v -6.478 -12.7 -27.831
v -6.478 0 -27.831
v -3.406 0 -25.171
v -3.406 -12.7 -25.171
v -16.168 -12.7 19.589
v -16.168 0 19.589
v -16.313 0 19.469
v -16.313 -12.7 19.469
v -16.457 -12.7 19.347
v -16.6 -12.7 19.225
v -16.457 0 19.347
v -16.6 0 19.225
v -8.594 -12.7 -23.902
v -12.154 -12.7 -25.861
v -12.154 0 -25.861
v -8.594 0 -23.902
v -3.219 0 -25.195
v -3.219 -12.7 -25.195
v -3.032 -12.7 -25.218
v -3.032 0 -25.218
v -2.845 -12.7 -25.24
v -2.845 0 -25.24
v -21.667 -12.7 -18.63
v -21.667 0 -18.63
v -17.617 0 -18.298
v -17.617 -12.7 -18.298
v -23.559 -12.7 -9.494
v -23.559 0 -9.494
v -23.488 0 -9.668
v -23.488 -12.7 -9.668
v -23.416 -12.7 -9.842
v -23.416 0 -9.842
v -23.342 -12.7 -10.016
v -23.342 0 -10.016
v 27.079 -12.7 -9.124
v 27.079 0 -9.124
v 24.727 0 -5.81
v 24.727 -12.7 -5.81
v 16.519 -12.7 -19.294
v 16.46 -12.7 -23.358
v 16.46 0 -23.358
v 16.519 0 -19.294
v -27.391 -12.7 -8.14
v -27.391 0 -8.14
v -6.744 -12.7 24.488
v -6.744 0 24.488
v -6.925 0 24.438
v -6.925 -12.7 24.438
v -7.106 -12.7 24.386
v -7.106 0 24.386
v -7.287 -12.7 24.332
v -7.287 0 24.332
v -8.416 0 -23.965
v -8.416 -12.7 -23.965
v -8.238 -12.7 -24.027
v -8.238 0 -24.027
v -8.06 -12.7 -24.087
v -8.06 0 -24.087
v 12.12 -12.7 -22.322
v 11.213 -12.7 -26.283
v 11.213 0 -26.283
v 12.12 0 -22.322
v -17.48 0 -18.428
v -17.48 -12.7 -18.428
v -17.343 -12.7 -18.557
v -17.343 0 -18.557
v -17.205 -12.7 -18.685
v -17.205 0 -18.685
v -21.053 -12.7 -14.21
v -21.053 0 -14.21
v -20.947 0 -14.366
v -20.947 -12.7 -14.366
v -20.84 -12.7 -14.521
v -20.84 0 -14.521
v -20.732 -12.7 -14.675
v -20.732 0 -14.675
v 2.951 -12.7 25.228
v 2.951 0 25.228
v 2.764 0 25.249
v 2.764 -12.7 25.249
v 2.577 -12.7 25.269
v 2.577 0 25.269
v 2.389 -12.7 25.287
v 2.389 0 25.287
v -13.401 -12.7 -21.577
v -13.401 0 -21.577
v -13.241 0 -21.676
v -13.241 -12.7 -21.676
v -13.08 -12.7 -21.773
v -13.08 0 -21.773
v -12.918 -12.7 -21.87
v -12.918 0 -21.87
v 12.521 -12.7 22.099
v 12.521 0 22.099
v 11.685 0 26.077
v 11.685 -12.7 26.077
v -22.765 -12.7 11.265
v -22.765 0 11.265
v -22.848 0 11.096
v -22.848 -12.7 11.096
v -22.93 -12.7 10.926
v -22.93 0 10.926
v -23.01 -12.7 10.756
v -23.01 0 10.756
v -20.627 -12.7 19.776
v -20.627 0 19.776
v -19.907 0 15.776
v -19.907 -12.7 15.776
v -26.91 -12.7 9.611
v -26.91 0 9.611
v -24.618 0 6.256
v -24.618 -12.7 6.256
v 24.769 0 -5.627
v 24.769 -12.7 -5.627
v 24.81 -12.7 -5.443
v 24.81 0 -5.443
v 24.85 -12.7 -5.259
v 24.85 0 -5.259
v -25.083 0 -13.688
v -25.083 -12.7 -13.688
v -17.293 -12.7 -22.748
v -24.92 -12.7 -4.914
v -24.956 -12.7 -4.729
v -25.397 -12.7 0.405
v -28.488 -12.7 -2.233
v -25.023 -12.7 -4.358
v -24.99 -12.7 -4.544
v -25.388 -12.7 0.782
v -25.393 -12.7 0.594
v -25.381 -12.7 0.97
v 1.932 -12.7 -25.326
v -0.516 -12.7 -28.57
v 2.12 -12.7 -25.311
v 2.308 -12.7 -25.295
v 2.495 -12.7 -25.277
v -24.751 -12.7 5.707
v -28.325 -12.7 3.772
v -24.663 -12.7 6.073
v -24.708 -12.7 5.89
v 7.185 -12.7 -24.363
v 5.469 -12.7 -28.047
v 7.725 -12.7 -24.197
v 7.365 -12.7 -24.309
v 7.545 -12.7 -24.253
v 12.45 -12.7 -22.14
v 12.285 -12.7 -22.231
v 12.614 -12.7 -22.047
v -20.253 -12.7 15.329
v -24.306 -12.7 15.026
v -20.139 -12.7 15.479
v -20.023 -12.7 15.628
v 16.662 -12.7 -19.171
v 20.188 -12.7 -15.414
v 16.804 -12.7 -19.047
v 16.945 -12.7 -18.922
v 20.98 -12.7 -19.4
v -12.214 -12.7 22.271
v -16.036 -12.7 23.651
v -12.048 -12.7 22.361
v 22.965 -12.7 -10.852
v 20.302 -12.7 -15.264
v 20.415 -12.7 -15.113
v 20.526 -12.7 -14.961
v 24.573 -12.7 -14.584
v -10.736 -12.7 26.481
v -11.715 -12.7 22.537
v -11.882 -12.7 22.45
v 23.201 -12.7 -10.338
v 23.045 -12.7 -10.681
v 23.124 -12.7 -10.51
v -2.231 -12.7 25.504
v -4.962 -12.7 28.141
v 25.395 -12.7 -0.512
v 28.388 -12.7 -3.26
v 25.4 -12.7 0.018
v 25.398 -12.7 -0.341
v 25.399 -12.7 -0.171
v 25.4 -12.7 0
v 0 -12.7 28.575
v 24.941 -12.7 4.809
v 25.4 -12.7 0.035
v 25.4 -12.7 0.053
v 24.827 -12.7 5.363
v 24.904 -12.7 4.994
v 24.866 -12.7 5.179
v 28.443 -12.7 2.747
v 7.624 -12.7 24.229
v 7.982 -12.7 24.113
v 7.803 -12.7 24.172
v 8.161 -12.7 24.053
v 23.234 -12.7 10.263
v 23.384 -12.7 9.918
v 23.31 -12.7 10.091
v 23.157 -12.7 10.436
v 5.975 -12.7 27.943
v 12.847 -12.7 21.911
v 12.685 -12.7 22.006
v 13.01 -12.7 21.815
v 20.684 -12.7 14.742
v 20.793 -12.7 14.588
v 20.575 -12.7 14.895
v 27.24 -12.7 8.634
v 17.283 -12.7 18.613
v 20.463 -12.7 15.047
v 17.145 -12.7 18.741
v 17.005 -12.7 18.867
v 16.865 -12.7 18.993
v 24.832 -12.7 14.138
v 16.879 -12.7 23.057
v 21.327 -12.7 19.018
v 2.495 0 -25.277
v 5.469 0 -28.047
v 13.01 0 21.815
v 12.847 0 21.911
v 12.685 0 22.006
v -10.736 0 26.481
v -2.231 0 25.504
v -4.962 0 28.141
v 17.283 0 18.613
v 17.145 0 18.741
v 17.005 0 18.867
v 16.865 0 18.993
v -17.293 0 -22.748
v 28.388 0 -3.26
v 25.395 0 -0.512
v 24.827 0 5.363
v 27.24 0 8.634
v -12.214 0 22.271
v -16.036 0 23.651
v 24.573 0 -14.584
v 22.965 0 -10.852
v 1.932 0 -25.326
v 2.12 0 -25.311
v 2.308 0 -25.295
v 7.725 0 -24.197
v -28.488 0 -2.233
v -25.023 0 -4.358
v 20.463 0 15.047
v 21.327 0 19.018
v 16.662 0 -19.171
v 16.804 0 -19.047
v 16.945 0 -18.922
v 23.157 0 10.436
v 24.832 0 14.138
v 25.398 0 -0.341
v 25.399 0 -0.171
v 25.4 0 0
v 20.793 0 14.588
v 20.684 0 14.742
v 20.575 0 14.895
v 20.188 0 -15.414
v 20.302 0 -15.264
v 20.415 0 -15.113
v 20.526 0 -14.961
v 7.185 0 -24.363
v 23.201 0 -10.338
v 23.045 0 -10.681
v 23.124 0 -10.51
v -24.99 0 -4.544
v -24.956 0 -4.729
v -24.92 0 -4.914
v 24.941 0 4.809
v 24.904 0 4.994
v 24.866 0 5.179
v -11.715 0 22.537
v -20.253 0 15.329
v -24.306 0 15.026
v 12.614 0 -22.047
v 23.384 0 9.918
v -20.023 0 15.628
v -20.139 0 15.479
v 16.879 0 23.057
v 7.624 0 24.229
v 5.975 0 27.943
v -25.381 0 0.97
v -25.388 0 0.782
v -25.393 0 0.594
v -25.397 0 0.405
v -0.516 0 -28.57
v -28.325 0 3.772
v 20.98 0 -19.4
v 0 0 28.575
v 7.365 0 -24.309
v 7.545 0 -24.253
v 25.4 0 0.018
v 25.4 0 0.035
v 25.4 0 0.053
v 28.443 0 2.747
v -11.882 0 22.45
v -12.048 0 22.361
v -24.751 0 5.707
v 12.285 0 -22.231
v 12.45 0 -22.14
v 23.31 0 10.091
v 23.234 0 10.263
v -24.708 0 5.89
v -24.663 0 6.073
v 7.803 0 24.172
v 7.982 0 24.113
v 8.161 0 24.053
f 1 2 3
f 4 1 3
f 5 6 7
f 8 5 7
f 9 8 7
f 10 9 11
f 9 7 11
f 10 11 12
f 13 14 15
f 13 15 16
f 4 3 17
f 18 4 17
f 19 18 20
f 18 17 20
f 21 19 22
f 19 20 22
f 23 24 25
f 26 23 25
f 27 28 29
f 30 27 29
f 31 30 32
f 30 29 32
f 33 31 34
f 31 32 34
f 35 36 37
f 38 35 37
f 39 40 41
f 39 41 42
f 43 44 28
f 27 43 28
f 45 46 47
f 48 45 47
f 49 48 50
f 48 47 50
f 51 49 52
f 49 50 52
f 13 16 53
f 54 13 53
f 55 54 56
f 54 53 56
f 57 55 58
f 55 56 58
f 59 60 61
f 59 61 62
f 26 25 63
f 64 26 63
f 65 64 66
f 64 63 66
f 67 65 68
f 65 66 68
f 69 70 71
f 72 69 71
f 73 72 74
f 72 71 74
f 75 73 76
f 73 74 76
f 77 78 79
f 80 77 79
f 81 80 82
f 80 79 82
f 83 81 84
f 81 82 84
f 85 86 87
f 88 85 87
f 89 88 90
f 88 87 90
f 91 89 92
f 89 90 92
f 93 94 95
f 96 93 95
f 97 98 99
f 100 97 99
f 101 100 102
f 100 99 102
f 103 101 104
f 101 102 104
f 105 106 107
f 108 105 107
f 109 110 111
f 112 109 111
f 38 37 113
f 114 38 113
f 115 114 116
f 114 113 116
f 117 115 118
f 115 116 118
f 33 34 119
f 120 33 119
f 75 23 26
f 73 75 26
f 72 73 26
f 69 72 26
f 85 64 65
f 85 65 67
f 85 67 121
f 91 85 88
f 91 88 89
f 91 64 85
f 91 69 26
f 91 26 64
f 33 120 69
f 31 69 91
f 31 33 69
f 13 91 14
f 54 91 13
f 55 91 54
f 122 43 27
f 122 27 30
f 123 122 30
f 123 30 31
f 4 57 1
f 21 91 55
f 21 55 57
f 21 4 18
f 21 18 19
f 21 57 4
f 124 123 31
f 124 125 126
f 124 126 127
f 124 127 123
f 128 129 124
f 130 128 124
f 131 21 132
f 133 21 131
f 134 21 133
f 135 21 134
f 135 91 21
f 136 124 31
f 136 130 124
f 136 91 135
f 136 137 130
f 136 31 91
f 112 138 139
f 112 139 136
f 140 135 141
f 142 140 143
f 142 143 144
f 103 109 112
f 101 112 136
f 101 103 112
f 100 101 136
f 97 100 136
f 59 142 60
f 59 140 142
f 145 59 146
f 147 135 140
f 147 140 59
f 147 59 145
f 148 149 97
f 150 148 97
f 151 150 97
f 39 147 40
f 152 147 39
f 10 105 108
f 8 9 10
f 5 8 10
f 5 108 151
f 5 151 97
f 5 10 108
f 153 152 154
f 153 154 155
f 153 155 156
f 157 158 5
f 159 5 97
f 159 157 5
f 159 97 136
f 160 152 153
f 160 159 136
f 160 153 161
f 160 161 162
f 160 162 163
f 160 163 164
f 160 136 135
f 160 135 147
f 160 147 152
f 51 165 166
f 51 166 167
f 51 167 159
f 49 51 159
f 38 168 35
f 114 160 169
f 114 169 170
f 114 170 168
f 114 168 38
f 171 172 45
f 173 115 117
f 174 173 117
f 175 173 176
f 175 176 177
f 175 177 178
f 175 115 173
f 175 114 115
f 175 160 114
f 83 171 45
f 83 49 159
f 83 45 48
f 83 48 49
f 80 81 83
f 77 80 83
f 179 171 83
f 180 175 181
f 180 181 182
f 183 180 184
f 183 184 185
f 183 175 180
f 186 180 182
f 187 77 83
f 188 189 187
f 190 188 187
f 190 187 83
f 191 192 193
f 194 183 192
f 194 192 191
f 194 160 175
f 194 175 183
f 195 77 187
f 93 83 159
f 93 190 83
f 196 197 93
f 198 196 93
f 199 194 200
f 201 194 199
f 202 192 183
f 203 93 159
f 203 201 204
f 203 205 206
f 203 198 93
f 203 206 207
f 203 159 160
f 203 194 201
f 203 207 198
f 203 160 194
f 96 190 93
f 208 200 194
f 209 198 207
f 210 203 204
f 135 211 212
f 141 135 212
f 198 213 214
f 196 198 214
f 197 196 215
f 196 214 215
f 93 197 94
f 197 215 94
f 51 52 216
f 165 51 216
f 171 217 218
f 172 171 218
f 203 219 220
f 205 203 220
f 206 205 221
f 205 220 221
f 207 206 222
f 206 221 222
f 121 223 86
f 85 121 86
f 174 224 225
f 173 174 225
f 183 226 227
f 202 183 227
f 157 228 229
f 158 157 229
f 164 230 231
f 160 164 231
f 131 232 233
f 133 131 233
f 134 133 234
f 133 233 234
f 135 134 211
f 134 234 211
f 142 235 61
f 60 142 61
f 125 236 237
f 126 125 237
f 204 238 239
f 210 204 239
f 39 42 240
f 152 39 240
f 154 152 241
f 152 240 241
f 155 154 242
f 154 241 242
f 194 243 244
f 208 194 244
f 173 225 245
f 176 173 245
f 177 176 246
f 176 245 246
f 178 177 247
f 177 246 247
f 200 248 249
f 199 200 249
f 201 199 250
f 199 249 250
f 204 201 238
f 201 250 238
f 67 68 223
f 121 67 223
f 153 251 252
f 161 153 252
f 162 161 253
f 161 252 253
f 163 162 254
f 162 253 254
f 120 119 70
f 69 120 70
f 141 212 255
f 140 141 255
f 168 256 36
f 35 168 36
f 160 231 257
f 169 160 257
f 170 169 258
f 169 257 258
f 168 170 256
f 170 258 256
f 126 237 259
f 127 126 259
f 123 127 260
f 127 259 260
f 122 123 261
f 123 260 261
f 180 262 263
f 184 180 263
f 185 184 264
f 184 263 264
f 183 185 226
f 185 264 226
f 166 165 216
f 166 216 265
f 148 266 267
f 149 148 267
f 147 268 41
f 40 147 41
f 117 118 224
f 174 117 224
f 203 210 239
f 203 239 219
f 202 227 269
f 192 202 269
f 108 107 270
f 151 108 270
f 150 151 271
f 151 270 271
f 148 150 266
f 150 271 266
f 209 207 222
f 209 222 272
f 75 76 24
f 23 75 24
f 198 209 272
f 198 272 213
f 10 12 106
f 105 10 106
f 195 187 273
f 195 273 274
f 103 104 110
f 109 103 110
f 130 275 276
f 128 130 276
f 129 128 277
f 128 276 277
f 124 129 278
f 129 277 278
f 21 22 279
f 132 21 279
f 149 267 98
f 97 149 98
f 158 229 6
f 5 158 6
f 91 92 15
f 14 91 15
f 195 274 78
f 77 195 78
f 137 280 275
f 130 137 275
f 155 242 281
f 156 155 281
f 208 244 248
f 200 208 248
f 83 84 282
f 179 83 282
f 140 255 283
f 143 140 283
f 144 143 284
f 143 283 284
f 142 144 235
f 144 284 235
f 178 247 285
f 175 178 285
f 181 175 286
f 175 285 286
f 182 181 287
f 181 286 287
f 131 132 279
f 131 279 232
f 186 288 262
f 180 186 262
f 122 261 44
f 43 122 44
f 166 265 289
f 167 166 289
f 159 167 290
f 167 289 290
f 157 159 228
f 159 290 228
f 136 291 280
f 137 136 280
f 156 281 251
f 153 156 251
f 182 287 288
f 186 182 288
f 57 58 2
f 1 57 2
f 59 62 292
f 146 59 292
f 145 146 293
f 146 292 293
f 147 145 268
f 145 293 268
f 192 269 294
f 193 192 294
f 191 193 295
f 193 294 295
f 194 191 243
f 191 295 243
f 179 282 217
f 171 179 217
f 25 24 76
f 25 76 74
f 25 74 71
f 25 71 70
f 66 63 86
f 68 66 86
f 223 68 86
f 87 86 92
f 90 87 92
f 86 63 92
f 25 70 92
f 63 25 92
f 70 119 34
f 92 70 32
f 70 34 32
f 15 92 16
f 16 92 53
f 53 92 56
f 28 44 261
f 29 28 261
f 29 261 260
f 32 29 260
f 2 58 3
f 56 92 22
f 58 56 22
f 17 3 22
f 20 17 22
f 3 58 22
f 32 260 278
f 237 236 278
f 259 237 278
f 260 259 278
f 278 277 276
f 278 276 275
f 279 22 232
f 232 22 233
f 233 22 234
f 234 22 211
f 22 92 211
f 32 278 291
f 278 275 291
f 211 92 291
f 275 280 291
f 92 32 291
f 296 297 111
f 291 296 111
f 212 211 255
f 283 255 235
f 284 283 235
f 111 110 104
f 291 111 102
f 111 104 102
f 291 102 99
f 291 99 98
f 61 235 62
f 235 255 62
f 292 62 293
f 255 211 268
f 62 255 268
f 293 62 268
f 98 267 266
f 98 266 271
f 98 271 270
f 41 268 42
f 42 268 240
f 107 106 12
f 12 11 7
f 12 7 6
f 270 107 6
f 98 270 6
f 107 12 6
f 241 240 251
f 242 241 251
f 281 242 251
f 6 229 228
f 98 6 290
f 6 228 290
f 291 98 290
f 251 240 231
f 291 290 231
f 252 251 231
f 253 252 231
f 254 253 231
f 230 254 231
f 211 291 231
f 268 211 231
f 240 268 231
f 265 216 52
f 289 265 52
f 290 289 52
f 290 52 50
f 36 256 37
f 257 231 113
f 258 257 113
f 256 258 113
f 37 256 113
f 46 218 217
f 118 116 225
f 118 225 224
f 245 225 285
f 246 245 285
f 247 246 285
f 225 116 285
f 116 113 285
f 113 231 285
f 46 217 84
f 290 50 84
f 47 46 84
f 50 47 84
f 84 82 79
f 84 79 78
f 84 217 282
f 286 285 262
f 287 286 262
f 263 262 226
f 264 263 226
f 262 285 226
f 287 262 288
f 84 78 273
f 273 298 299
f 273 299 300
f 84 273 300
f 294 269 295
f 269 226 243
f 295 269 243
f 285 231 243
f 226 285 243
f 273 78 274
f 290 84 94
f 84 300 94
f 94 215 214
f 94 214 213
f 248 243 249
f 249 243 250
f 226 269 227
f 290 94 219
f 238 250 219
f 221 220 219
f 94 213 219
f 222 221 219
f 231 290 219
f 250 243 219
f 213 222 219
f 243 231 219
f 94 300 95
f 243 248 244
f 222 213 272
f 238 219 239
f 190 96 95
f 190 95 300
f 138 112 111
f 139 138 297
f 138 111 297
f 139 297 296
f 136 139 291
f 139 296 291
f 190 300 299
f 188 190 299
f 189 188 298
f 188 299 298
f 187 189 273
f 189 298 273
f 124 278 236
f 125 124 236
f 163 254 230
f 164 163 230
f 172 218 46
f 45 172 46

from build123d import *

# Parameters (mm, degrees)
F1_DEPTH = 12.7


with BuildPart() as f1:
    # F0 (on Front) → F1 (new body)
    with BuildSketch(Plane.XZ):
        with BuildLine():
            ThreePointArc((25.3948429948, -0.5118097985), (25.398710716, -0.2559178894), (25.4, 0))
            ThreePointArc((25.4, 0), (25.3999860485, 0.0266220613), (25.3999441942, 0.0532440933))
            ThreePointArc((25.3999441942, 0.0532440933), (25.2823297123, 2.4420901537), (24.9405452403, 4.8092830148))
            ThreePointArc((24.9405452403, 4.8092830148), (24.8855058459, 5.0864131562), (24.8273871825, 5.3629139178))
            ThreePointArc((24.8273871825, 5.3629139178), (24.2128911527, 7.6743665555), (23.383707488, 9.917773143))
            ThreePointArc((23.383707488, 9.917773143), (23.2719398097, 10.1772696484), (23.1572925209, 10.4355068444))
            ThreePointArc((23.1572925209, 10.4355068444), (22.0730798045, 12.5673842921), (20.7931524471, 14.5878309324))
            ThreePointArc((20.7931524471, 14.5878309324), (20.6295973686, 14.8182223093), (20.4634896365, 15.0467801172))
            ThreePointArc((20.4634896365, 15.0467801172), (18.9574897343, 16.9048390402), (17.2834000897, 18.6130083903))
            ThreePointArc((17.2834000897, 18.6130083903), (17.0752878467, 18.8041097889), (16.8650627512, 18.9928844149))
            ThreePointArc((16.8650627512, 18.9928844149), (15.0038509972, 20.4949861004), (13.0096050977, 21.8153655757))
            ThreePointArc((13.0096050977, 21.8153655757), (12.7661356522, 21.9587290277), (12.5210865577, 22.0993753625))
            ThreePointArc((12.5210865577, 22.0993753625), (10.386941041, 23.1791168039), (8.1606979804, 24.053336743))
            ThreePointArc((8.1606979804, 24.053336743), (7.892634321, 24.1426246186), (7.6235940472, 24.2289251475))
            ThreePointArc((7.6235940472, 24.2289251475), (5.3108583666, 24.8385745044), (2.9510330751, 25.2279885007))
            ThreePointArc((2.9510330751, 25.2279885007), (2.6702254201, 25.2592536748), (2.3890873582, 25.2873933333))
            ThreePointArc((2.3890873582, 25.2873933333), (0.1760546114, 25.3993898504), (-2.0383180173, 25.3180816742))
            ThreePointArc((-2.0383180173, 25.3180816742), (-2.2137558658, 25.3033453315), (-2.3890873582, 25.2873933333))
            ThreePointArc((-2.3890873582, 25.2873933333), (-4.5839377077, 24.982944484), (-6.7439015233, 24.4883603421))
            ThreePointArc((-6.7439015233, 24.4883603421), (-7.0158820659, 24.411829076), (-7.2869944811, 24.3322771526))
            ThreePointArc((-7.2869944811, 24.3322771526), (-9.5433476931, 23.5389998685), (-11.7150832222, 22.5370101189))
            ThreePointArc((-11.7150832222, 22.5370101189), (-11.9650502401, 22.4053023356), (-12.2135367333, 22.2708221775))
            ThreePointArc((-12.2135367333, 22.2708221775), (-14.2541514602, 21.0233005532), (-16.1683793774, 19.5893723306))
            ThreePointArc((-16.1683793774, 19.5893723306), (-16.3852826458, 19.4083104009), (-16.6001584412, 19.2248469364))
            ThreePointArc((-16.6001584412, 19.2248469364), (-18.3348257747, 17.5782298259), (-19.9069243197, 15.7757524109))
            ThreePointArc((-19.9069243197, 15.7757524109), (-20.0811752538, 15.5533404909), (-20.2529413947, 15.3290040402))
            ThreePointArc((-20.2529413947, 15.3290040402), (-21.604977361, 13.3560830047), (-22.7654491948, 11.2647380332))
            ThreePointArc((-22.7654491948, 11.2647380332), (-22.8893447304, 11.010808227), (-23.010407997, 10.7555159715))
            ThreePointArc((-23.010407997, 10.7555159715), (-23.9200435047, 8.5435074024), (-24.61758796, 6.255746401))
            ThreePointArc((-24.61758796, 6.255746401), (-24.6856510803, 5.9815241155), (-24.7506596611, 5.7065616914))
            ThreePointArc((-24.7506596611, 5.7065616914), (-25.1776826971, 3.3532512586), (-25.3814636132, 0.9702086645))
            ThreePointArc((-25.3814636132, 0.9702086645), (-25.3906854701, 0.6878163708), (-25.3967655484, 0.4053389684))
            ThreePointArc((-25.3967655484, 0.4053389684), (-25.3222988198, -1.9852411648), (-25.0233077083, -4.3582188263))
            ThreePointArc((-25.0233077083, -4.3582188263), (-24.9732806336, -4.6362974879), (-24.920163429, -4.9138024658))
            ThreePointArc((-24.920163429, -4.9138024658), (-24.3474988664, -7.2359725641), (-23.5589531473, -9.4939837057))
            ThreePointArc((-23.5589531473, -9.4939837057), (-23.4518886745, -9.7554557863), (-23.341922325, -10.0157207516))
            ThreePointArc((-23.341922325, -10.0157207516), (-22.2963755574, -12.166825264), (-21.0531342598, -14.2100505924))
            ThreePointArc((-21.0531342598, -14.2100505924), (-20.8937653594, -14.4433572658), (-20.7318111179, -14.674876755))
            ThreePointArc((-20.7318111179, -14.674876755), (-19.2596023508, -16.5598223809), (-17.6166251096, -18.2979375818))
            ThreePointArc((-17.6166251096, -18.2979375818), (-17.4119969598, -18.4927651224), (-17.2052142941, -18.6853044154))
            ThreePointArc((-17.2052142941, -18.6853044154), (-15.3714250659, -20.2207638689), (-13.4013425355, -21.5769325495))
            ThreePointArc((-13.4013425355, -21.5769325495), (-13.1605010782, -21.7246682684), (-12.918031174, -21.8697158323))
            ThreePointArc((-12.918031174, -21.8697158323), (-10.8037273136, -22.987811469), (-8.5936304044, -23.9020818439))
            ThreePointArc((-8.5936304044, -23.9020818439), (-8.3272224532, -23.9961948278), (-8.0597841127, -24.0873385839))
            ThreePointArc((-8.0597841127, -24.0873385839), (-5.7584320841, -24.7386430496), (-3.4060219576, -25.1705982135))
            ThreePointArc((-3.4060219576, -25.1705982135), (-3.1258245374, -25.206928035), (-2.8452403356, -25.2401388156))
            ThreePointArc((-2.8452403356, -25.2401388156), (-0.458575391, -25.3958600683), (1.9321555888, -25.3264046951))
            ThreePointArc((1.9321555888, -25.3264046951), (2.2137558658, -25.3033453315), (2.4950822182, -25.2771549966))
            ThreePointArc((2.4950822182, -25.2771549966), (4.8615534215, -24.9304091088), (7.1849188511, -24.3626135934))
            ThreePointArc((7.1849188511, -24.3626135934), (7.4554733568, -24.2811844239), (7.7251053413, -24.1967507626))
            ThreePointArc((7.7251053413, -24.1967507626), (9.9667688451, -23.3628662366), (12.1200603317, -22.3218309633))
            ThreePointArc((12.1200603317, -22.3218309633), (12.3676087357, -22.1856317052), (12.6136268034, -22.0466872537))
            ThreePointArc((12.6136268034, -22.0466872537), (14.63138599, -20.7625273994), (16.5194135542, -19.2942731354))
            ThreePointArc((16.5194135542, -19.2942731354), (16.7330125505, -19.1093247129), (16.9445410466, -18.9220117514))
            ThreePointArc((16.9445410466, -18.9220117514), (18.6491973766, -17.2443450791), (20.1884974899, -15.4137785471))
            ThreePointArc((20.1884974899, -15.4137785471), (20.358704565, -15.1882569255), (20.526392506, -14.9608559478))
            ThreePointArc((20.526392506, -14.9608559478), (21.842588694, -12.9638466185), (22.9651139288, -10.8518911824))
            ThreePointArc((22.9651139288, -10.8518911824), (23.0844047841, -10.5957659356), (23.2008392342, -10.3383295957))
            ThreePointArc((23.2008392342, -10.3383295957), (24.070390548, -8.1102588655), (24.7265177324, -5.8102771732))
            ThreePointArc((24.7265177324, -5.8102771732), (24.789618909, -5.5348707613), (24.8496526816, -5.2587794786))
            ThreePointArc((24.8496526816, -5.2587794786), (25.2341190995, -2.8981430728), (25.3948429948, -0.5118097985))
        make_face()
        with BuildLine():
            ThreePointArc((24.9405452403, 4.8092830148), (25.2823297123, 2.4420901537), (25.3999441942, 0.0532440933))
            Line((25.3999441942, 0.0532440933), (28.4426209263, 2.7473514229))
            Line((28.4426209263, 2.7473514229), (24.9405452403, 4.8092830148))
        make_face()
        with BuildLine():
            Line((28.388383987, -3.2604109569), (25.3948429948, -0.5118097985))
            ThreePointArc((25.3948429948, -0.5118097985), (25.2341190995, -2.8981430728), (24.8496526816, -5.2587794786))
            Line((24.8496526816, -5.2587794786), (28.388383987, -3.2604109569))
        make_face()
        with BuildLine():
            ThreePointArc((23.383707488, 9.917773143), (24.2128911527, 7.6743665555), (24.8273871825, 5.3629139178))
            Line((24.8273871825, 5.3629139178), (27.2395025468, 8.6336623749))
            Line((27.2395025468, 8.6336623749), (23.383707488, 9.917773143))
        make_face()
        with BuildLine():
            Line((27.0791893665, -9.1240412236), (24.7265177324, -5.8102771732))
            ThreePointArc((24.7265177324, -5.8102771732), (24.070390548, -8.1102588655), (23.2008392342, -10.3383295957))
            Line((23.2008392342, -10.3383295957), (27.0791893665, -9.1240412236))
        make_face()
        with BuildLine():
            ThreePointArc((20.7931524471, 14.5878309324), (22.0730798045, 12.5673842921), (23.1572925209, 10.4355068444))
            Line((23.1572925209, 10.4355068444), (24.83221478, 14.1383073286))
            Line((24.83221478, 14.1383073286), (20.7931524471, 14.5878309324))
        make_face()
        with BuildLine():
            Line((24.5729122807, -14.5843274458), (22.9651139288, -10.8518911824))
            ThreePointArc((22.9651139288, -10.8518911824), (21.842588694, -12.9638466185), (20.526392506, -14.9608559478))
            Line((20.526392506, -14.9608559478), (24.5729122807, -14.5843274458))
        make_face()
        with BuildLine():
            ThreePointArc((17.2834000897, 18.6130083903), (18.9574897343, 16.9048390402), (20.4634896365, 15.0467801172))
            Line((20.4634896365, 15.0467801172), (21.3271759511, 19.0179439202))
            Line((21.3271759511, 19.0179439202), (17.2834000897, 18.6130083903))
        make_face()
        with BuildLine():
            Line((20.9803470487, -19.399888214), (20.1884974899, -15.4137785471))
            ThreePointArc((20.1884974899, -15.4137785471), (18.6491973766, -17.2443450791), (16.9445410466, -18.9220117514))
            Line((16.9445410466, -18.9220117514), (20.9803470487, -19.399888214))
        make_face()
        with BuildLine():
            ThreePointArc((13.0096050977, 21.8153655757), (15.0038509972, 20.4949861004), (16.8650627512, 18.9928844149))
            Line((16.8650627512, 18.9928844149), (16.8793323718, 23.0568593629))
            Line((16.8793323718, 23.0568593629), (13.0096050977, 21.8153655757))
        make_face()
        with BuildLine():
            Line((16.4603092388, -23.3578433243), (16.5194135542, -19.2942731354))
            ThreePointArc((16.5194135542, -19.2942731354), (14.63138599, -20.7625273994), (12.6136268034, -22.0466872537))
            Line((12.6136268034, -22.0466872537), (16.4603092388, -23.3578433243))
        make_face()
        with BuildLine():
            ThreePointArc((8.1606979804, 24.053336743), (10.386941041, 23.1791168039), (12.5210865577, 22.0993753625))
            Line((12.5210865577, 22.0993753625), (11.6853086711, 26.0765064044))
            Line((11.6853086711, 26.0765064044), (8.1606979804, 24.053336743))
        make_face()
        with BuildLine():
            Line((11.2126149507, -26.2832245162), (12.1200603317, -22.3218309633))
            ThreePointArc((12.1200603317, -22.3218309633), (9.9667688451, -23.3628662366), (7.7251053413, -24.1967507626))
            Line((7.7251053413, -24.1967507626), (11.2126149507, -26.2832245162))
        make_face()
        with BuildLine():
            ThreePointArc((2.9510330751, 25.2279885007), (5.3108583666, 24.8385745044), (7.6235940472, 24.2289251475))
            Line((7.6235940472, 24.2289251475), (5.9747156624, 27.9433963174))
            Line((5.9747156624, 27.9433963174), (2.9510330751, 25.2279885007))
        make_face()
        with BuildLine():
            Line((5.4692475992, -28.0467102473), (7.1849188511, -24.3626135934))
            ThreePointArc((7.1849188511, -24.3626135934), (4.8615534215, -24.9304091088), (2.4950822182, -25.2771549966))
            Line((2.4950822182, -25.2771549966), (5.4692475992, -28.0467102473))
        make_face()
        with BuildLine():
            ThreePointArc((-2.0383180173, 25.3180816742), (0.1760546114, 25.3993898504), (2.3890873582, 25.2873933333))
            Line((2.3890873582, 25.2873933333), (0, 28.575))
            Line((0, 28.575), (-2.2313505794, 25.5044538287))
            Line((-2.2313505794, 25.5044538287), (-2.0383180173, 25.3180816742))
        make_face()
        with BuildLine():
            Line((-0.5158973148, -28.5703425769), (1.9321555888, -25.3264046951))
            ThreePointArc((1.9321555888, -25.3264046951), (-0.458575391, -25.3958600683), (-2.8452403356, -25.2401388156))
            Line((-2.8452403356, -25.2401388156), (-0.5158973148, -28.5703425769))
        make_face()
        with BuildLine():
            ThreePointArc((-2.3890873582, 25.2873933333), (-2.2137558658, 25.3033453315), (-2.0383180173, 25.3180816742))
            Line((-2.0383180173, 25.3180816742), (-2.2313505794, 25.5044538287))
            Line((-2.2313505794, 25.5044538287), (-2.3890873582, 25.2873933333))
        make_face()
        with BuildLine():
            ThreePointArc((-6.7439015233, 24.4883603421), (-4.5839377077, 24.982944484), (-2.3890873582, 25.2873933333))
            Line((-2.3890873582, 25.2873933333), (-2.2313505794, 25.5044538287))
            Line((-2.2313505794, 25.5044538287), (-4.9619966768, 28.1408815423))
            Line((-4.9619966768, 28.1408815423), (-6.7439015233, 24.4883603421))
        make_face()
        with BuildLine():
            Line((-6.4782360946, -27.8309734307), (-3.4060219576, -25.1705982135))
            ThreePointArc((-3.4060219576, -25.1705982135), (-5.7584320841, -24.7386430496), (-8.0597841127, -24.0873385839))
            Line((-8.0597841127, -24.0873385839), (-6.4782360946, -27.8309734307))
        make_face()
        with BuildLine():
            ThreePointArc((-11.7150832222, 22.5370101189), (-9.5433476931, 23.5389998685), (-7.2869944811, 24.3322771526))
            Line((-7.2869944811, 24.3322771526), (-10.7362661547, 26.481374852))
            Line((-10.7362661547, 26.481374852), (-11.7150832222, 22.5370101189))
        make_face()
        with BuildLine():
            Line((-12.1541932278, -25.8612879026), (-8.5936304044, -23.9020818439))
            ThreePointArc((-8.5936304044, -23.9020818439), (-10.8037273136, -22.987811469), (-12.918031174, -21.8697158323))
            Line((-12.918031174, -21.8697158323), (-12.1541932278, -25.8612879026))
        make_face()
        with BuildLine():
            ThreePointArc((-16.1683793774, 19.5893723306), (-14.2541514602, 21.0233005532), (-12.2135367333, 22.2708221775))
            Line((-12.2135367333, 22.2708221775), (-16.0359203927, 23.6512131223))
            Line((-16.0359203927, 23.6512131223), (-16.1683793774, 19.5893723306))
        make_face()
        with BuildLine():
            Line((-17.2928531992, -22.7483593525), (-13.4013425355, -21.5769325495))
            ThreePointArc((-13.4013425355, -21.5769325495), (-15.3714250659, -20.2207638689), (-17.2052142941, -18.6853044154))
            Line((-17.2052142941, -18.6853044154), (-17.2928531992, -22.7483593525))
        make_face()
        with BuildLine():
            ThreePointArc((-19.9069243197, 15.7757524109), (-18.3348257747, 17.5782298259), (-16.6001584412, 19.2248469364))
            Line((-16.6001584412, 19.2248469364), (-20.6266789965, 19.7755085541))
            Line((-20.6266789965, 19.7755085541), (-19.9069243197, 15.7757524109))
        make_face()
        with BuildLine():
            Line((-21.6670526447, -18.6298001786), (-17.6166251096, -18.2979375818))
            ThreePointArc((-17.6166251096, -18.2979375818), (-19.2596023508, -16.5598223809), (-20.7318111179, -14.674876755))
            Line((-20.7318111179, -14.674876755), (-21.6670526447, -18.6298001786))
        make_face()
        with BuildLine():
            ThreePointArc((-22.7654491948, 11.2647380332), (-21.604977361, 13.3560830047), (-20.2529413947, 15.3290040402))
            Line((-20.2529413947, 15.3290040402), (-24.3055995312, 15.0255933803))
            Line((-24.3055995312, 15.0255933803), (-22.7654491948, 11.2647380332))
        make_face()
        with BuildLine():
            Line((-25.083422502, -13.687678422), (-21.0531342598, -14.2100505924))
            ThreePointArc((-21.0531342598, -14.2100505924), (-22.2963755574, -12.166825264), (-23.341922325, -10.0157207516))
            Line((-23.341922325, -10.0157207516), (-25.083422502, -13.687678422))
        make_face()
        with BuildLine():
            ThreePointArc((-24.61758796, 6.255746401), (-23.9200435047, 8.5435074024), (-23.010407997, 10.7555159715))
            Line((-23.010407997, 10.7555159715), (-26.9100489427, 9.6114458277))
            Line((-26.9100489427, 9.6114458277), (-24.61758796, 6.255746401))
        make_face()
        with BuildLine():
            Line((-27.3909362247, -8.1404691347), (-23.5589531473, -9.4939837057))
            ThreePointArc((-23.5589531473, -9.4939837057), (-24.3474988664, -7.2359725641), (-24.920163429, -4.9138024658))
            Line((-24.920163429, -4.9138024658), (-27.3909362247, -8.1404691347))
        make_face()
        with BuildLine():
            ThreePointArc((-25.3814636132, 0.9702086645), (-25.1776826971, 3.3532512586), (-24.7506596611, 5.7065616914))
            Line((-24.7506596611, 5.7065616914), (-28.3248930343, 3.7724076659))
            Line((-28.3248930343, 3.7724076659), (-25.3814636132, 0.9702086645))
        make_face()
        with BuildLine():
            Line((-28.4875861722, -2.2333963104), (-25.0233077083, -4.3582188263))
            ThreePointArc((-25.0233077083, -4.3582188263), (-25.3222988198, -1.9852411648), (-25.3967655484, 0.4053389684))
            Line((-25.3967655484, 0.4053389684), (-28.4875861722, -2.2333963104))
        make_face()
    extrude(amount=F1_DEPTH)


solid = f1.part
